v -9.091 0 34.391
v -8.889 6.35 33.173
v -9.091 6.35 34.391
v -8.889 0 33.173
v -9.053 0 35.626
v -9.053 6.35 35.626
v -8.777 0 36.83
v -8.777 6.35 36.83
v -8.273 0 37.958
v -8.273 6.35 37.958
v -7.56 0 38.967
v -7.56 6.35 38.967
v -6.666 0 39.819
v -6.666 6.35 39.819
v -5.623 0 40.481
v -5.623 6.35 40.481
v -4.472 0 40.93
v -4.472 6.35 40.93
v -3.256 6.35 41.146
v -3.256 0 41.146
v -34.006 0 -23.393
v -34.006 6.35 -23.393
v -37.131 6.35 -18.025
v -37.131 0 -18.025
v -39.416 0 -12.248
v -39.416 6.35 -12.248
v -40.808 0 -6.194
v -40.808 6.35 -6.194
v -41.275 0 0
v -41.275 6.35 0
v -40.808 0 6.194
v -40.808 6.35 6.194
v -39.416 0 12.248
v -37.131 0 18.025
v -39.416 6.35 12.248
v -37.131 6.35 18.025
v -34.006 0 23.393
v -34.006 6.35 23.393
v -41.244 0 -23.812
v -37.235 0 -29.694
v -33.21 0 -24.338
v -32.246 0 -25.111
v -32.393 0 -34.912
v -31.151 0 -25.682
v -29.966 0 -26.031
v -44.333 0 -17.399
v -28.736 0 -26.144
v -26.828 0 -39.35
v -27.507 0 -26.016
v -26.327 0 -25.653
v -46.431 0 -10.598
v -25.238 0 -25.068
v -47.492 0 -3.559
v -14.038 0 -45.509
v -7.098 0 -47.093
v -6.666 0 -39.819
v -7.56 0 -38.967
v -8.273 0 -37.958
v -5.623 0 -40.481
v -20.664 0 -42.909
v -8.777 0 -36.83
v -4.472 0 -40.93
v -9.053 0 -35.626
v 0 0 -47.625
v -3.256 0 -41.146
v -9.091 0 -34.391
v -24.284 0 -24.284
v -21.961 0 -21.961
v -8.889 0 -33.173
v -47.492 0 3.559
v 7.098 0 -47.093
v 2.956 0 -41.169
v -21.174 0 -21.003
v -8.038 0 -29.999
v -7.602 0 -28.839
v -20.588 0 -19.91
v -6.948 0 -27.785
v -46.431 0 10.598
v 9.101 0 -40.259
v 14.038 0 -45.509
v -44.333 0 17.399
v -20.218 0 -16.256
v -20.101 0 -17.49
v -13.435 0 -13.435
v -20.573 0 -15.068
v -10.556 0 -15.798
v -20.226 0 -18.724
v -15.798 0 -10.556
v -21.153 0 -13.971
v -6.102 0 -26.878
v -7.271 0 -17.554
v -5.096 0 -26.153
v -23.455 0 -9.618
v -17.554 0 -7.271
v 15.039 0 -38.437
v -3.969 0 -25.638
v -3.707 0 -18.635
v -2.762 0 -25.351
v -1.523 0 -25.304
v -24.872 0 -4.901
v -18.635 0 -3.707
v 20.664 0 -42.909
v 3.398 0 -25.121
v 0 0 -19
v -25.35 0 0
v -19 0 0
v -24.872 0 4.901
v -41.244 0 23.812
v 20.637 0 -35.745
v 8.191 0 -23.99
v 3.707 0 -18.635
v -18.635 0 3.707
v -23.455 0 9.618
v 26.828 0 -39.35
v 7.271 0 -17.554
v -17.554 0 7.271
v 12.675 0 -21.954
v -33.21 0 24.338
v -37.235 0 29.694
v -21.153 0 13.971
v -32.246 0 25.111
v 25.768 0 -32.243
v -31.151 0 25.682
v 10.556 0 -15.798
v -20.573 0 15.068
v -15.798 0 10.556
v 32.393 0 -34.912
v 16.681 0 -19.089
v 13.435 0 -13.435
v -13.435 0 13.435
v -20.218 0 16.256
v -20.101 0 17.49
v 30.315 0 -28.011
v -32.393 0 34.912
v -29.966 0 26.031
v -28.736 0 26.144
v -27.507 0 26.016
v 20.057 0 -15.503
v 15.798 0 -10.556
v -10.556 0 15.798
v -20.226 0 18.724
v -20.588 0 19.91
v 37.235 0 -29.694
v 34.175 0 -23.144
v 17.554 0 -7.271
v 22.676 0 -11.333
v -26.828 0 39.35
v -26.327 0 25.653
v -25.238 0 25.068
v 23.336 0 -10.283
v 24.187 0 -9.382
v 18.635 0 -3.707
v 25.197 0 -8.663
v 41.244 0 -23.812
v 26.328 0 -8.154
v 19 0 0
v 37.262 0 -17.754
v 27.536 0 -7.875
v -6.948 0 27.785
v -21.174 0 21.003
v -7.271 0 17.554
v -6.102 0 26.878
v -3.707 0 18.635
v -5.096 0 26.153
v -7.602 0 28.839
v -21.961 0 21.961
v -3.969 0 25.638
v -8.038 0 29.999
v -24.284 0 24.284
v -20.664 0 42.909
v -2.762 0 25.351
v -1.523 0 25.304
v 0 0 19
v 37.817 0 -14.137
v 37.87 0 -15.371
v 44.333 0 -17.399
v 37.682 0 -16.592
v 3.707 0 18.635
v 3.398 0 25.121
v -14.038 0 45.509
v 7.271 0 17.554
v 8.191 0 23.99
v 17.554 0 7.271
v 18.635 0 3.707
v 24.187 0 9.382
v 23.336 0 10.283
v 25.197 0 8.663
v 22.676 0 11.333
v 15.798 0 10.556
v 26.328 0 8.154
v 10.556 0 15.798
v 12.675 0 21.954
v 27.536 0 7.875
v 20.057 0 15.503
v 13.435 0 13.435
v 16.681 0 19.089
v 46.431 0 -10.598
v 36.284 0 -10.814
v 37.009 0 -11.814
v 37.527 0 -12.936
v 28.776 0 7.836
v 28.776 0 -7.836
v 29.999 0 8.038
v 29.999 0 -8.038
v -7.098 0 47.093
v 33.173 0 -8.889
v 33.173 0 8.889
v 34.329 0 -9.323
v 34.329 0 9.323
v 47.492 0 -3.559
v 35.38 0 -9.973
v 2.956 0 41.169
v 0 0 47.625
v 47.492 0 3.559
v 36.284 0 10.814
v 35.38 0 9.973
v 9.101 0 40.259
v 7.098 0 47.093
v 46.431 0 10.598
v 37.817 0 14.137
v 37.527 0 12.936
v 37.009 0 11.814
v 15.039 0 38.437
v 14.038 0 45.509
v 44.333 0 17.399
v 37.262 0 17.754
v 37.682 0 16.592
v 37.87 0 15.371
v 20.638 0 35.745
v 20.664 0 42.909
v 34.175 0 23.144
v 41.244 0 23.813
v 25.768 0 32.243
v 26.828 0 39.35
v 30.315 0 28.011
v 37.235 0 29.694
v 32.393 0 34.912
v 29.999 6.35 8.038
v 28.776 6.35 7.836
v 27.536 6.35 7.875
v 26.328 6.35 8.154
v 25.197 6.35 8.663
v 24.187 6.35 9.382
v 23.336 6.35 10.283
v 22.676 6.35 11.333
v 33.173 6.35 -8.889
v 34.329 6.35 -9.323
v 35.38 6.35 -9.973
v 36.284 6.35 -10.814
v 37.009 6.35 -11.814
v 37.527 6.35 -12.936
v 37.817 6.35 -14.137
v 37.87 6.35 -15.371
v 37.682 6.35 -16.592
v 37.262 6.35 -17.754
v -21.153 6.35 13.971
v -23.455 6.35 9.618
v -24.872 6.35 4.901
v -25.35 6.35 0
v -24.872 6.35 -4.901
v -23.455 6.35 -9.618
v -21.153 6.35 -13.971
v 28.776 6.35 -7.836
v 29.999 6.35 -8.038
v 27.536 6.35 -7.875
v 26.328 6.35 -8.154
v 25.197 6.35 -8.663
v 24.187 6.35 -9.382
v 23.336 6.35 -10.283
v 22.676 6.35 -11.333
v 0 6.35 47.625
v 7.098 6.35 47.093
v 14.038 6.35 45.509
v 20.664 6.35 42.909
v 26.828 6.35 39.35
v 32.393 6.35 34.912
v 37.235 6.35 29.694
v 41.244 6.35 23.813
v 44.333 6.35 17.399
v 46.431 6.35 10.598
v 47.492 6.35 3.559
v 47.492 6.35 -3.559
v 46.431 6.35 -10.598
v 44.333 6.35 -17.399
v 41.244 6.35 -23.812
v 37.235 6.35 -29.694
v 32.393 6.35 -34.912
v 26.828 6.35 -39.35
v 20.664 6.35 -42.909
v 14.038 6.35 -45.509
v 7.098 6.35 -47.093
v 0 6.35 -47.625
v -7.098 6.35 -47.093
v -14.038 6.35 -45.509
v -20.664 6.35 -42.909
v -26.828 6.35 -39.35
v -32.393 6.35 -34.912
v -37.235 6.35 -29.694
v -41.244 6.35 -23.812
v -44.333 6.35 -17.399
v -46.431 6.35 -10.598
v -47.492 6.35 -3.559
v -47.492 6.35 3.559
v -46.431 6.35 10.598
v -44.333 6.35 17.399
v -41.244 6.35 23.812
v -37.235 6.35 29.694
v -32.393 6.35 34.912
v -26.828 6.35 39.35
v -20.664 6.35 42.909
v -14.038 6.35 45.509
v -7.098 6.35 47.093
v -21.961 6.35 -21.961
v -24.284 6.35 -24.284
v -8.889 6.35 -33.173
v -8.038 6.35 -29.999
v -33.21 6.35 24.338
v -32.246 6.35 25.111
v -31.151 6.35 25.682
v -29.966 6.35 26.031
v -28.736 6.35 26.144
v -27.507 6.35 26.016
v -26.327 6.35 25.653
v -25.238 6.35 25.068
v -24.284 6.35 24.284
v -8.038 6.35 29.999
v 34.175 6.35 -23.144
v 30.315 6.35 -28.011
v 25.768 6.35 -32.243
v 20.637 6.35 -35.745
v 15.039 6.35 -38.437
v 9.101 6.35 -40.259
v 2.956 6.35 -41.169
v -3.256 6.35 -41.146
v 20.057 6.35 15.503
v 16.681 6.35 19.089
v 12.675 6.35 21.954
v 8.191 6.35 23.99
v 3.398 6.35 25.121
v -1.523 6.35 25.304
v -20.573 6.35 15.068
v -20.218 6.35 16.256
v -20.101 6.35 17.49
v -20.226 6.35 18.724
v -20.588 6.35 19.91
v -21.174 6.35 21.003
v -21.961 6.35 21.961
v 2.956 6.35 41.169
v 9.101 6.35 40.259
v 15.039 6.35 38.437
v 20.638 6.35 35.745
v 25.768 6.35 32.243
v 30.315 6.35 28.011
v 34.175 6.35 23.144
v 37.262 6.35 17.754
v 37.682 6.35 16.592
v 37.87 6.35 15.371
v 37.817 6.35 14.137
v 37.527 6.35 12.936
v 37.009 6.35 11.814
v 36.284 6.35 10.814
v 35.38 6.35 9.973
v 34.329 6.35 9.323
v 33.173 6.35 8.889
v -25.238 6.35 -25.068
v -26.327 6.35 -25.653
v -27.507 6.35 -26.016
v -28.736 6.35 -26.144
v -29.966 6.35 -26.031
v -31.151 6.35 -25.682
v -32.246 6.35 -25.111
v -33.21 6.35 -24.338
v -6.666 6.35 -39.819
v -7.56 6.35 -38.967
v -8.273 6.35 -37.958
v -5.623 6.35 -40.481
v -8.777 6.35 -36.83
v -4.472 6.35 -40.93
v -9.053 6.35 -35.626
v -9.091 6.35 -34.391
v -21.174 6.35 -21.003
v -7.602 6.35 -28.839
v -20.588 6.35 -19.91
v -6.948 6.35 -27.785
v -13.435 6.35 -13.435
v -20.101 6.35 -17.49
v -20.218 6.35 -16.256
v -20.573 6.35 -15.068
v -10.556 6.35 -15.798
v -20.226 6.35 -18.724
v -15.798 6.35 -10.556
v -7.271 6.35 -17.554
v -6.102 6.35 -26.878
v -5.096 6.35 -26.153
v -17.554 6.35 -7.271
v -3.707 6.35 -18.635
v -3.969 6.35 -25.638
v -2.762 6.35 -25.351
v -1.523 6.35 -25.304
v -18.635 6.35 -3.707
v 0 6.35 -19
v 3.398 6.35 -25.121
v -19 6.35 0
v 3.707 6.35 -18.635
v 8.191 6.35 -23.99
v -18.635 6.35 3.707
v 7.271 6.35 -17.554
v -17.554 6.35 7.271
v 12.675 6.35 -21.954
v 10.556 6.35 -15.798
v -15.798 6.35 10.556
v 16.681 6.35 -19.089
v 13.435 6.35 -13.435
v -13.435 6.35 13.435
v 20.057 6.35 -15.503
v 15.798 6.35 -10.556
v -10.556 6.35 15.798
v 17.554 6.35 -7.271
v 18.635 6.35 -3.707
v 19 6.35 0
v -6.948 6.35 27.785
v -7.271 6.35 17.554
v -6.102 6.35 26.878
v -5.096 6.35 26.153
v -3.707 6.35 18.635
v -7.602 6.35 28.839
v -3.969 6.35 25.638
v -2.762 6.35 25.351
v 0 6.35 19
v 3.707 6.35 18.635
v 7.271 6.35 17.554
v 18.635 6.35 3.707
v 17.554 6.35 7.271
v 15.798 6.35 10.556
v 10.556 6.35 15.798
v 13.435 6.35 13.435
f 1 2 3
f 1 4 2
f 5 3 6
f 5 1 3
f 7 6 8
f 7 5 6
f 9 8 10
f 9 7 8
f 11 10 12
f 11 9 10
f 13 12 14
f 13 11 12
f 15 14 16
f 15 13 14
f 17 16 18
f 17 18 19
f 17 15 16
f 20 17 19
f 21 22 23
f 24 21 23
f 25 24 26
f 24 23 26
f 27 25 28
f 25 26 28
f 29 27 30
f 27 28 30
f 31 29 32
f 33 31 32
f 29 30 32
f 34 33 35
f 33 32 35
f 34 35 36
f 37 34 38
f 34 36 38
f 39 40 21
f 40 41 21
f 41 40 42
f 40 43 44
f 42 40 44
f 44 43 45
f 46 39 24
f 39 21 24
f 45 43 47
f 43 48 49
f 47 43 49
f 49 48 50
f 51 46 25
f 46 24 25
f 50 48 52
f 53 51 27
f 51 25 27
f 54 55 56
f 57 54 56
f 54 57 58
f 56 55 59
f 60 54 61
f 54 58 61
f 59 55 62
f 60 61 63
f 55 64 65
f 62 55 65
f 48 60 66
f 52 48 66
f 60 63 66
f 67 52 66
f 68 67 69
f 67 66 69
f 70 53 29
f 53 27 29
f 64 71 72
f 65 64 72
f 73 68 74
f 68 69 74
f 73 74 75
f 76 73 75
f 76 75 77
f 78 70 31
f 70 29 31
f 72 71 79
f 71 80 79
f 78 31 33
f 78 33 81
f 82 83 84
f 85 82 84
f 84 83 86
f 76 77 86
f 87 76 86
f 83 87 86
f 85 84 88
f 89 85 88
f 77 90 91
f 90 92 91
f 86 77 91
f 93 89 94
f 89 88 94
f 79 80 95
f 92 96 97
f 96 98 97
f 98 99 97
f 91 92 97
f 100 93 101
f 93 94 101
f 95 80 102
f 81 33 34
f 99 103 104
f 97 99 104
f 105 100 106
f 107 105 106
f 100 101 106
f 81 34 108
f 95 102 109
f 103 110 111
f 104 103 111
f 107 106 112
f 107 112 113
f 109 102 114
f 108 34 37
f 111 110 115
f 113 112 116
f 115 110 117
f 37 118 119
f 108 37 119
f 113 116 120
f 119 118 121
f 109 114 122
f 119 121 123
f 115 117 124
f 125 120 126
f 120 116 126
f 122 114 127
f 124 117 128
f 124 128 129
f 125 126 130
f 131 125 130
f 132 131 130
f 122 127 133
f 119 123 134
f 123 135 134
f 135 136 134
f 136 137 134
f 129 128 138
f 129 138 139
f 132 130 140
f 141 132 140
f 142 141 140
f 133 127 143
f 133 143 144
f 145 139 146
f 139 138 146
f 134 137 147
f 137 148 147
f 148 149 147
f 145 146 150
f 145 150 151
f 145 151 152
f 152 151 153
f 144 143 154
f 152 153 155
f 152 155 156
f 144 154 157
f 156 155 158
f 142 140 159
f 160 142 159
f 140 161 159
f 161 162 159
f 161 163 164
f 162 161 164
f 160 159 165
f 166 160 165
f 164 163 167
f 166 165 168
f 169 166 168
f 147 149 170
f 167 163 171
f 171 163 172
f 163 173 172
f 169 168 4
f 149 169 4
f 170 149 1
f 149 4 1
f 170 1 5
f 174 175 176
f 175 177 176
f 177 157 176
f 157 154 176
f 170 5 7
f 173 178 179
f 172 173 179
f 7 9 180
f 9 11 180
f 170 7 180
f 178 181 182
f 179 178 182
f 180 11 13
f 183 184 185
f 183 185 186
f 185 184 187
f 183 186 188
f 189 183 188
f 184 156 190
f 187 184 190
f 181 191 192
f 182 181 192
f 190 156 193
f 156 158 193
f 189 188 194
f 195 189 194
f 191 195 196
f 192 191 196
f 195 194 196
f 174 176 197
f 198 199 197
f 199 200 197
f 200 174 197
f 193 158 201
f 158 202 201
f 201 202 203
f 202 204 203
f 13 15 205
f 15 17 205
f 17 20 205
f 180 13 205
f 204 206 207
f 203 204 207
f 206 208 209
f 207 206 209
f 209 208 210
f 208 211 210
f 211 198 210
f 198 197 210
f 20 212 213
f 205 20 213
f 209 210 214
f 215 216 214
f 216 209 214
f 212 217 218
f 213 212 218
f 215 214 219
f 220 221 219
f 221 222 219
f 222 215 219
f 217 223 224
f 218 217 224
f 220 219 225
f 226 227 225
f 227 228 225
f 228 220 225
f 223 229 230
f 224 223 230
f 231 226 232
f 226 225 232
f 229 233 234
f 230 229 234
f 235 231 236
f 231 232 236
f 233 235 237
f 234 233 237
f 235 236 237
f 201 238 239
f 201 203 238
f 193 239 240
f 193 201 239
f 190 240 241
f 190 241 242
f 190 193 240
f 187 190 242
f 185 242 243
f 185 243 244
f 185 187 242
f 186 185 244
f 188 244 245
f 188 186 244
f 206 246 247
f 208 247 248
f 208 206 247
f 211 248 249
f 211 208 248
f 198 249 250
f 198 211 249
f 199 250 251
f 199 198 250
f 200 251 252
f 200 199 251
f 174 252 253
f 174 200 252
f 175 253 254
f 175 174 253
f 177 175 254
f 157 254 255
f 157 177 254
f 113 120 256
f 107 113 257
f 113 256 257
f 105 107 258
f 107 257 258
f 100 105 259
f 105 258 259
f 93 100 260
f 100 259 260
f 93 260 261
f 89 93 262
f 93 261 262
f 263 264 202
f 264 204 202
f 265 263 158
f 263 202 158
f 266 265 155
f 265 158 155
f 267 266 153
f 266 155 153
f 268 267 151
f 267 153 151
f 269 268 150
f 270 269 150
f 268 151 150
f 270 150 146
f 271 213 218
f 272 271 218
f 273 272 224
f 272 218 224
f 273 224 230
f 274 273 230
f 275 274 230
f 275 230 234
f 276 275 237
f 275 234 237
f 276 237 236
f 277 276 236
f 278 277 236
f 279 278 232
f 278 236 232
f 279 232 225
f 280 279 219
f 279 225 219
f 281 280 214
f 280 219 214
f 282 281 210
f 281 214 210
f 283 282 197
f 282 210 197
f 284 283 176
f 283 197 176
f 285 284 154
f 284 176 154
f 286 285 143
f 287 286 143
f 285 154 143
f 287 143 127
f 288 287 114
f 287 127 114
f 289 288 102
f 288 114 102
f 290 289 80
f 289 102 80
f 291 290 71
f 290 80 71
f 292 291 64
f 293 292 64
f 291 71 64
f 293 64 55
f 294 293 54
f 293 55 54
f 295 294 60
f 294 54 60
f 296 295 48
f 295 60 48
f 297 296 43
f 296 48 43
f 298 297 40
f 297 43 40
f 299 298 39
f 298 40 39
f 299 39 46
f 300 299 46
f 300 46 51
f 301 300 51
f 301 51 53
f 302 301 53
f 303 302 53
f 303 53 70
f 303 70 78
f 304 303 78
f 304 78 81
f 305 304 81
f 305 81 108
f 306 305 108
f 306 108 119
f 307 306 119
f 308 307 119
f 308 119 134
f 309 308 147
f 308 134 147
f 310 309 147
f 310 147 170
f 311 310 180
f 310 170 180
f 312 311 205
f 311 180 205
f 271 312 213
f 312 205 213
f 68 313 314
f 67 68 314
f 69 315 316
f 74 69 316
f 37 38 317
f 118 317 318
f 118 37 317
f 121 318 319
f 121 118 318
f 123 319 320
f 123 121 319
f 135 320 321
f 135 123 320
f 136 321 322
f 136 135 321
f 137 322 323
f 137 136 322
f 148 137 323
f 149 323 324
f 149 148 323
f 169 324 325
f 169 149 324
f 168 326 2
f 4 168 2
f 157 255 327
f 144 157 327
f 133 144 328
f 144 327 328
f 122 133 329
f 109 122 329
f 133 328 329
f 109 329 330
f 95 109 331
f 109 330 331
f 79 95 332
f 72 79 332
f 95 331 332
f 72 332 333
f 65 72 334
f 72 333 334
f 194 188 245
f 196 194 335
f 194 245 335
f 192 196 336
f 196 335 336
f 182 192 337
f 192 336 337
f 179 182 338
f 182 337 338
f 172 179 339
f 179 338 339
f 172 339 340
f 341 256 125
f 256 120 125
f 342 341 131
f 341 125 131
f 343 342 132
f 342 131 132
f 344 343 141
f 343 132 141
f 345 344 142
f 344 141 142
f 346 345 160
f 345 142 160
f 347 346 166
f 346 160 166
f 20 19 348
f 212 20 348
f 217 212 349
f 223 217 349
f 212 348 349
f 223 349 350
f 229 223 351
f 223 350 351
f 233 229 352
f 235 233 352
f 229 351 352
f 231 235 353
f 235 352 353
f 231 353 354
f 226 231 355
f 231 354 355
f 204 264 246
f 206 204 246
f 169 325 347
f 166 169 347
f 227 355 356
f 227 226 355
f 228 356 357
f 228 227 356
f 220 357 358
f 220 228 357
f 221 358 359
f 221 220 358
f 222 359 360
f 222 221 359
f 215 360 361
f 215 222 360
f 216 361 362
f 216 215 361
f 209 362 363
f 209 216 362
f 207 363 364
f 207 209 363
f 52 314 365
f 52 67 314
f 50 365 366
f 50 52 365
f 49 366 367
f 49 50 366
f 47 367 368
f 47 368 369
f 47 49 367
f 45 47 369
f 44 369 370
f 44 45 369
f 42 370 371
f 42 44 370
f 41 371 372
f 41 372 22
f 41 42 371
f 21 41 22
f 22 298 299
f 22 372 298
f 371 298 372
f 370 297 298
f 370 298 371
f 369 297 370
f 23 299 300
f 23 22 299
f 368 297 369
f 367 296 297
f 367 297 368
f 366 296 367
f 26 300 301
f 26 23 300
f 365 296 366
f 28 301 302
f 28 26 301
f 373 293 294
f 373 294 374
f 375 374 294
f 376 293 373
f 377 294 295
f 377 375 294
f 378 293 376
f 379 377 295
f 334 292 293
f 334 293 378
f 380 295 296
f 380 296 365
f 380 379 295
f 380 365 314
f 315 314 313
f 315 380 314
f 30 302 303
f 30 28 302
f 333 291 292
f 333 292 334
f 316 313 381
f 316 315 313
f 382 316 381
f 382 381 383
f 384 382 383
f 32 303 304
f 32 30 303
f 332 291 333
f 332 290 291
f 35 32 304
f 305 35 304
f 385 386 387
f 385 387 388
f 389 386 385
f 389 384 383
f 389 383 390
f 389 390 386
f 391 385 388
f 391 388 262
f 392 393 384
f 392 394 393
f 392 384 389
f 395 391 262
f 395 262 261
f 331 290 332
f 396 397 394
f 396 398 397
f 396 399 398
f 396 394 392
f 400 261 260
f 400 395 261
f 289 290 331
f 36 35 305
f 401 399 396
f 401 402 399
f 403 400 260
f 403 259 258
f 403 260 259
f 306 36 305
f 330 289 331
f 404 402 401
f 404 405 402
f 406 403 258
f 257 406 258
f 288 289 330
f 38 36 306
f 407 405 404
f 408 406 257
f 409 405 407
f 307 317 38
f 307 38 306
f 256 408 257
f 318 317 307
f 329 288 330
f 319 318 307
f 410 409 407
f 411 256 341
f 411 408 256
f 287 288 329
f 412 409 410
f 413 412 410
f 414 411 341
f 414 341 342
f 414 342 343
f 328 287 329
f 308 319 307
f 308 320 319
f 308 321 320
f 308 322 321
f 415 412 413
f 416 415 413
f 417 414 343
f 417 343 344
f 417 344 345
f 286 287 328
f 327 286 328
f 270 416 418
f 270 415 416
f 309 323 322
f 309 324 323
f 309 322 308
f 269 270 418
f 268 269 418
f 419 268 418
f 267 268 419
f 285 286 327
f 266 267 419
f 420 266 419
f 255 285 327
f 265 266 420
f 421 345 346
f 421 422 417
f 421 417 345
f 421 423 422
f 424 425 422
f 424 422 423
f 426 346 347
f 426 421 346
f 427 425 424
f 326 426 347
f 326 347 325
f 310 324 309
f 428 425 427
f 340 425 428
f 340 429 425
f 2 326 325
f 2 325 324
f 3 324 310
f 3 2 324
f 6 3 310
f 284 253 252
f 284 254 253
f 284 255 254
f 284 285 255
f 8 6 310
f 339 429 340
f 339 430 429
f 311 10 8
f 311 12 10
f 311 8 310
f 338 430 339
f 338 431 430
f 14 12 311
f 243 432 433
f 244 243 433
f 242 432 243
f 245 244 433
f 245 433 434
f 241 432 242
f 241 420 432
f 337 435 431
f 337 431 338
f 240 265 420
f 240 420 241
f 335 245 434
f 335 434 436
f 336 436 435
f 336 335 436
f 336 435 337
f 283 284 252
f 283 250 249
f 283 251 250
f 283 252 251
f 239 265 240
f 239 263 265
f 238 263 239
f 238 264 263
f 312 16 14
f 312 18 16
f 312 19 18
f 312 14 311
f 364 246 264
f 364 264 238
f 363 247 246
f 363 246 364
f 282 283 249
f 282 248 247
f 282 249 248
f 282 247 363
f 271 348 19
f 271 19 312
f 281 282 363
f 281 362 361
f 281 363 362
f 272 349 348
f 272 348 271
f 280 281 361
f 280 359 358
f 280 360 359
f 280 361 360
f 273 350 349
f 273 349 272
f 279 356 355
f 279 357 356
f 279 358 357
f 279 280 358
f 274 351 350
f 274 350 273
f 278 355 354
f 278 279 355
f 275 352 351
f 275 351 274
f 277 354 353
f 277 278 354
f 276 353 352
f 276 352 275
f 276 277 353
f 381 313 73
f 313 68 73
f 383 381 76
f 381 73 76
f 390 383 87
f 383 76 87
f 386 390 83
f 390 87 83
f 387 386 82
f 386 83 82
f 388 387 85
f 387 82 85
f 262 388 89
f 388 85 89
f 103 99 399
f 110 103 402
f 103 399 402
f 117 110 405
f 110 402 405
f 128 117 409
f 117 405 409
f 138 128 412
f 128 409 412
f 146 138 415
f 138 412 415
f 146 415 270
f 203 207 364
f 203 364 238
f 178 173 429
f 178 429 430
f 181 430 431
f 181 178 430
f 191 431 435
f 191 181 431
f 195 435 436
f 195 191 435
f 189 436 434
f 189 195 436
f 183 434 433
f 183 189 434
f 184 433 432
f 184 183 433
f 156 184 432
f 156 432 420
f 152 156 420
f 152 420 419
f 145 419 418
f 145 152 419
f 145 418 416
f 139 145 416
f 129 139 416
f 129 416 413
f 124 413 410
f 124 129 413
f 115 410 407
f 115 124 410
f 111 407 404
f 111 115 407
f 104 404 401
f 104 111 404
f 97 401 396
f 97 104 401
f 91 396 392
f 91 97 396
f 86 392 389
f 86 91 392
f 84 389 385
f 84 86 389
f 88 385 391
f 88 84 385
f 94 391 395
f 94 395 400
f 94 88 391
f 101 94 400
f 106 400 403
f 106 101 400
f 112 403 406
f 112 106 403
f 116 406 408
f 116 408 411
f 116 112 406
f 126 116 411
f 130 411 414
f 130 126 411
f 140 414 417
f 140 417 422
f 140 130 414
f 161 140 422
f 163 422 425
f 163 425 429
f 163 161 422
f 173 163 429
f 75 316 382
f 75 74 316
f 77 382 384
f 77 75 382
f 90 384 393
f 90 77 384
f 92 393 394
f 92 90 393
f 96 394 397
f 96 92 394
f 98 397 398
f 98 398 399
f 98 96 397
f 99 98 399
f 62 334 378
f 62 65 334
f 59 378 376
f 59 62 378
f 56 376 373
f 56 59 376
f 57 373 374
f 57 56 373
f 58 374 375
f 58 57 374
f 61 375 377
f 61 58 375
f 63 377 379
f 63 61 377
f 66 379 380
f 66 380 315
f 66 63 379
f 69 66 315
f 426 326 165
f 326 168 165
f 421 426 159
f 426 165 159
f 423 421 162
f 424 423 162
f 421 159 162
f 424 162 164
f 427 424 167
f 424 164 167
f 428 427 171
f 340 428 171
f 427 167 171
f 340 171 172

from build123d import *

# Parameters (mm, degrees)
SKETCH2_R                = 47.625
SKETCH2_R_2              = 19
BOSS_EXTRUDE1_DEPTH      = 6.35
CUT_EXTRUDE1_DEPTH       = 68.650600515
FILLET1_R                = 6.35
CIRPATTERN1_COUNT        = 3
FILLET1_OF_CIRPATTERN1_R = 6.35


with BuildPart() as part:
    # Sketch2 → Boss-Extrude1 (new body)
    with BuildSketch(Plane(origin=(0, 0, 0), x_dir=(1, 0, 0), z_dir=(0, 1, 0))):
        with Locations(Location((0, 0, 0), (0, 0, 270))):
            Circle(SKETCH2_R)
        with Locations(Location((0, 0, 0), (0, 0, 270))):
            Circle(SKETCH2_R_2, mode=Mode.SUBTRACT)
    extrude(amount=BOSS_EXTRUDE1_DEPTH)

    # Sketch3 → Cut-Extrude1 (cut, through all)
    with BuildSketch(Plane(origin=(0, 6.35, 0), x_dir=(1, 0, 0), z_dir=(0, 1, 0))):
        with BuildLine():
            Line((24.486219696, 6.561062793), (39.86858848, 10.682756087))
            ThreePointArc((39.86858848, 10.682756087), (20.6375, 35.745198541), (-10.682756087, 39.86858848))
            Line((-10.682756087, 39.86858848), (-6.561062793, 24.486219696))
            ThreePointArc((-6.561062793, 24.486219696), (12.675, 21.953743986), (24.486219696, 6.561062793))
        make_face()
    cut_extrude1 = extrude(amount=-CUT_EXTRUDE1_DEPTH, mode=Mode.SUBTRACT)

    # Fillet1
    fillet1_edges = [part.edges().sort_by_distance(p)[0] for p in [
        (24.486219696, 3.175, -6.561062793),
        (-6.561062793, 3.175, -24.486219696),
        (-10.682756087, 3.175, -39.86858848),
        (39.86858848, 3.175, -10.682756087),
    ]]
    fillet(fillet1_edges, radius=FILLET1_R)

    # CirPattern1: Cut-Extrude1 ×3 about axis
    cirpattern1_axis = Axis((0, 0, 0), (0, 1, 0))
    for i in range(1, CIRPATTERN1_COUNT):
        add(cut_extrude1.rotate(cirpattern1_axis, i * 360 / CIRPATTERN1_COUNT), mode=Mode.SUBTRACT)

    # Fillet1 of CirPattern1
    fillet1_of_cirpattern1_edges = [part.edges().sort_by_distance(p)[0] for p in [
        (-17.925156903, 3.175, -17.925156903),
        (-17.925156903, 3.175, 17.925156903),
        (-29.185832393, 3.175, 29.185832393),
        (-29.185832393, 3.175, -29.185832393),
        (-6.561062793, 3.175, 24.486219696),
        (24.486219696, 3.175, 6.561062793),
        (39.86858848, 3.175, 10.682756087),
        (-10.682756087, 3.175, 39.86858848),
    ]]
    fillet(fillet1_of_cirpattern1_edges, radius=FILLET1_OF_CIRPATTERN1_R)


solid = part.part
